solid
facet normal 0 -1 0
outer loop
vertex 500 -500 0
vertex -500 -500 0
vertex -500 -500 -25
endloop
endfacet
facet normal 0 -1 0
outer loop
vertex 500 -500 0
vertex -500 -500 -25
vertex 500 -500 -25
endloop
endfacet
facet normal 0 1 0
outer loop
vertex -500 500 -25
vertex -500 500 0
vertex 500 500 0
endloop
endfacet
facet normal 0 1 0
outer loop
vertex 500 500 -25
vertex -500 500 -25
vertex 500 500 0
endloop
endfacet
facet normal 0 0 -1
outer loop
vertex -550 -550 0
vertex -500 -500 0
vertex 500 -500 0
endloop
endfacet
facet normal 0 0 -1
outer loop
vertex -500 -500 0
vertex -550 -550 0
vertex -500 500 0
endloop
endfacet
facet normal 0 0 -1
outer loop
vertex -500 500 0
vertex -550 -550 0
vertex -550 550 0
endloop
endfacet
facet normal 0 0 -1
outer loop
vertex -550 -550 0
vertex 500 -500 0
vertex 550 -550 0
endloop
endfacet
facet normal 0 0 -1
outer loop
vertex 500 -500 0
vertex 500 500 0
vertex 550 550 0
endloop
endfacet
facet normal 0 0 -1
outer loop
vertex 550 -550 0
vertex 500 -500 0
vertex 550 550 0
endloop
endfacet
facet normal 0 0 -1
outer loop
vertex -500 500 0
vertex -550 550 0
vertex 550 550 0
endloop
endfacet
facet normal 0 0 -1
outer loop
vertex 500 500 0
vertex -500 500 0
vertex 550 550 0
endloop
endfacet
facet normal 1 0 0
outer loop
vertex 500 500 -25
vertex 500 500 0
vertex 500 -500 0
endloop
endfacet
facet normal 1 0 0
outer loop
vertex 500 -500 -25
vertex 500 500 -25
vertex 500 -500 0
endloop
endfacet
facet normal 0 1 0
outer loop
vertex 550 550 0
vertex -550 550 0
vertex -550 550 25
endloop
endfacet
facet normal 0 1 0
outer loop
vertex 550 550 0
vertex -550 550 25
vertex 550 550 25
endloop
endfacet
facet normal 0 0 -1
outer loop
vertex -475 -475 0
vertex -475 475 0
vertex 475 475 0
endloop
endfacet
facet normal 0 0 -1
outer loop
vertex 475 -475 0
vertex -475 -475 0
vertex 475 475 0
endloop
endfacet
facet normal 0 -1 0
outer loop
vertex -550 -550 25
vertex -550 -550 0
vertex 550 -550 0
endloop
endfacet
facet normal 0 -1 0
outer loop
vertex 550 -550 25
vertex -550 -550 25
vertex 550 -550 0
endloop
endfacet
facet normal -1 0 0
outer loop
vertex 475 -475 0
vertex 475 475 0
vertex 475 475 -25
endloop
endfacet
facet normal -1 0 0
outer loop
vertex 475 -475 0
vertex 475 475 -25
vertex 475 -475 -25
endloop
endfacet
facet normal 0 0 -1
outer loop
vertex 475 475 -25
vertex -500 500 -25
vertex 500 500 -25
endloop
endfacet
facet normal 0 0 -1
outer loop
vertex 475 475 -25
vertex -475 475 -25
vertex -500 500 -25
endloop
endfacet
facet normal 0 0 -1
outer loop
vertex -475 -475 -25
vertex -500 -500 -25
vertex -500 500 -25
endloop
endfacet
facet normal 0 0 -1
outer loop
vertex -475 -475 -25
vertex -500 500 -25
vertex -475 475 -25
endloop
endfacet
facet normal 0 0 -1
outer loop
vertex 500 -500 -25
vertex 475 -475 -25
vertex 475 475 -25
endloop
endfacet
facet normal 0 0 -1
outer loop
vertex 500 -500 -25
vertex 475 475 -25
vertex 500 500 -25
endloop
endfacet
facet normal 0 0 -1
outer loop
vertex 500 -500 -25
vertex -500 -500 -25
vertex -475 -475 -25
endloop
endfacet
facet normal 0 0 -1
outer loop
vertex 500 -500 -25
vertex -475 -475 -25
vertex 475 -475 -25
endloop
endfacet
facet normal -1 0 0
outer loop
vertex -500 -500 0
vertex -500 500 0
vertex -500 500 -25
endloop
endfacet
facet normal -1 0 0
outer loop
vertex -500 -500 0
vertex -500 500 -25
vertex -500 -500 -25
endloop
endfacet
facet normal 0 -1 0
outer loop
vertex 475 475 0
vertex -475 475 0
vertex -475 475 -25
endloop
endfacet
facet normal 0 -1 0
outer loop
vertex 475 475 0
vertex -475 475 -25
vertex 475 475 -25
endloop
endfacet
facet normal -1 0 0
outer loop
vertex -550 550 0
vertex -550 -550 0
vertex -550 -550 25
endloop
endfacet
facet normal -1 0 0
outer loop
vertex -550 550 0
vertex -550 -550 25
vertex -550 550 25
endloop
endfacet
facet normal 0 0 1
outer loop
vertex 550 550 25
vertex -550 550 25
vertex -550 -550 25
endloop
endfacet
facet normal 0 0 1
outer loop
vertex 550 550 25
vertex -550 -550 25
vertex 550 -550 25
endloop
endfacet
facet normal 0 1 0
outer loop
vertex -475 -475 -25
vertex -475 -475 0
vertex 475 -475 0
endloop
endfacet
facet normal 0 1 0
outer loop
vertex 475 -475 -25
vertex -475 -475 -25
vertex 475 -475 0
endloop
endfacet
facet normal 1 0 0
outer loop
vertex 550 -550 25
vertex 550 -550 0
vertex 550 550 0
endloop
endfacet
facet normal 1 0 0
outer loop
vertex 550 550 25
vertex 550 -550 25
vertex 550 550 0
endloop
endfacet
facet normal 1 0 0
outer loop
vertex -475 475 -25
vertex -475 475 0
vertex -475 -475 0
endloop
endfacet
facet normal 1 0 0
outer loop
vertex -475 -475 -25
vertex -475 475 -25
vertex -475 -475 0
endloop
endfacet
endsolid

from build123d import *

# Parameters (mm, degrees)
F0_W     = 1100
F0_H     = 1100
F1_DEPTH = 25
F2_W     = 1000
F2_H     = 1000
F2_W_2   = 950
F2_H_2   = 950
F3_DEPTH = 25


with BuildPart() as f1:
    # F0 (on Top) → F1 (new body)
    with BuildSketch(Plane.XY):
        Rectangle(F0_W, F0_H)
    extrude(amount=F1_DEPTH)

    # F2 (on face) → F3 (join)
    with BuildSketch(Plane(origin=(0, 0, 0), x_dir=(1, 0, 0), z_dir=(0, 0, -1))):
        Rectangle(F2_W, F2_H)
        Rectangle(F2_W_2, F2_H_2, mode=Mode.SUBTRACT)
    extrude(amount=F3_DEPTH)


solid = f1.part
